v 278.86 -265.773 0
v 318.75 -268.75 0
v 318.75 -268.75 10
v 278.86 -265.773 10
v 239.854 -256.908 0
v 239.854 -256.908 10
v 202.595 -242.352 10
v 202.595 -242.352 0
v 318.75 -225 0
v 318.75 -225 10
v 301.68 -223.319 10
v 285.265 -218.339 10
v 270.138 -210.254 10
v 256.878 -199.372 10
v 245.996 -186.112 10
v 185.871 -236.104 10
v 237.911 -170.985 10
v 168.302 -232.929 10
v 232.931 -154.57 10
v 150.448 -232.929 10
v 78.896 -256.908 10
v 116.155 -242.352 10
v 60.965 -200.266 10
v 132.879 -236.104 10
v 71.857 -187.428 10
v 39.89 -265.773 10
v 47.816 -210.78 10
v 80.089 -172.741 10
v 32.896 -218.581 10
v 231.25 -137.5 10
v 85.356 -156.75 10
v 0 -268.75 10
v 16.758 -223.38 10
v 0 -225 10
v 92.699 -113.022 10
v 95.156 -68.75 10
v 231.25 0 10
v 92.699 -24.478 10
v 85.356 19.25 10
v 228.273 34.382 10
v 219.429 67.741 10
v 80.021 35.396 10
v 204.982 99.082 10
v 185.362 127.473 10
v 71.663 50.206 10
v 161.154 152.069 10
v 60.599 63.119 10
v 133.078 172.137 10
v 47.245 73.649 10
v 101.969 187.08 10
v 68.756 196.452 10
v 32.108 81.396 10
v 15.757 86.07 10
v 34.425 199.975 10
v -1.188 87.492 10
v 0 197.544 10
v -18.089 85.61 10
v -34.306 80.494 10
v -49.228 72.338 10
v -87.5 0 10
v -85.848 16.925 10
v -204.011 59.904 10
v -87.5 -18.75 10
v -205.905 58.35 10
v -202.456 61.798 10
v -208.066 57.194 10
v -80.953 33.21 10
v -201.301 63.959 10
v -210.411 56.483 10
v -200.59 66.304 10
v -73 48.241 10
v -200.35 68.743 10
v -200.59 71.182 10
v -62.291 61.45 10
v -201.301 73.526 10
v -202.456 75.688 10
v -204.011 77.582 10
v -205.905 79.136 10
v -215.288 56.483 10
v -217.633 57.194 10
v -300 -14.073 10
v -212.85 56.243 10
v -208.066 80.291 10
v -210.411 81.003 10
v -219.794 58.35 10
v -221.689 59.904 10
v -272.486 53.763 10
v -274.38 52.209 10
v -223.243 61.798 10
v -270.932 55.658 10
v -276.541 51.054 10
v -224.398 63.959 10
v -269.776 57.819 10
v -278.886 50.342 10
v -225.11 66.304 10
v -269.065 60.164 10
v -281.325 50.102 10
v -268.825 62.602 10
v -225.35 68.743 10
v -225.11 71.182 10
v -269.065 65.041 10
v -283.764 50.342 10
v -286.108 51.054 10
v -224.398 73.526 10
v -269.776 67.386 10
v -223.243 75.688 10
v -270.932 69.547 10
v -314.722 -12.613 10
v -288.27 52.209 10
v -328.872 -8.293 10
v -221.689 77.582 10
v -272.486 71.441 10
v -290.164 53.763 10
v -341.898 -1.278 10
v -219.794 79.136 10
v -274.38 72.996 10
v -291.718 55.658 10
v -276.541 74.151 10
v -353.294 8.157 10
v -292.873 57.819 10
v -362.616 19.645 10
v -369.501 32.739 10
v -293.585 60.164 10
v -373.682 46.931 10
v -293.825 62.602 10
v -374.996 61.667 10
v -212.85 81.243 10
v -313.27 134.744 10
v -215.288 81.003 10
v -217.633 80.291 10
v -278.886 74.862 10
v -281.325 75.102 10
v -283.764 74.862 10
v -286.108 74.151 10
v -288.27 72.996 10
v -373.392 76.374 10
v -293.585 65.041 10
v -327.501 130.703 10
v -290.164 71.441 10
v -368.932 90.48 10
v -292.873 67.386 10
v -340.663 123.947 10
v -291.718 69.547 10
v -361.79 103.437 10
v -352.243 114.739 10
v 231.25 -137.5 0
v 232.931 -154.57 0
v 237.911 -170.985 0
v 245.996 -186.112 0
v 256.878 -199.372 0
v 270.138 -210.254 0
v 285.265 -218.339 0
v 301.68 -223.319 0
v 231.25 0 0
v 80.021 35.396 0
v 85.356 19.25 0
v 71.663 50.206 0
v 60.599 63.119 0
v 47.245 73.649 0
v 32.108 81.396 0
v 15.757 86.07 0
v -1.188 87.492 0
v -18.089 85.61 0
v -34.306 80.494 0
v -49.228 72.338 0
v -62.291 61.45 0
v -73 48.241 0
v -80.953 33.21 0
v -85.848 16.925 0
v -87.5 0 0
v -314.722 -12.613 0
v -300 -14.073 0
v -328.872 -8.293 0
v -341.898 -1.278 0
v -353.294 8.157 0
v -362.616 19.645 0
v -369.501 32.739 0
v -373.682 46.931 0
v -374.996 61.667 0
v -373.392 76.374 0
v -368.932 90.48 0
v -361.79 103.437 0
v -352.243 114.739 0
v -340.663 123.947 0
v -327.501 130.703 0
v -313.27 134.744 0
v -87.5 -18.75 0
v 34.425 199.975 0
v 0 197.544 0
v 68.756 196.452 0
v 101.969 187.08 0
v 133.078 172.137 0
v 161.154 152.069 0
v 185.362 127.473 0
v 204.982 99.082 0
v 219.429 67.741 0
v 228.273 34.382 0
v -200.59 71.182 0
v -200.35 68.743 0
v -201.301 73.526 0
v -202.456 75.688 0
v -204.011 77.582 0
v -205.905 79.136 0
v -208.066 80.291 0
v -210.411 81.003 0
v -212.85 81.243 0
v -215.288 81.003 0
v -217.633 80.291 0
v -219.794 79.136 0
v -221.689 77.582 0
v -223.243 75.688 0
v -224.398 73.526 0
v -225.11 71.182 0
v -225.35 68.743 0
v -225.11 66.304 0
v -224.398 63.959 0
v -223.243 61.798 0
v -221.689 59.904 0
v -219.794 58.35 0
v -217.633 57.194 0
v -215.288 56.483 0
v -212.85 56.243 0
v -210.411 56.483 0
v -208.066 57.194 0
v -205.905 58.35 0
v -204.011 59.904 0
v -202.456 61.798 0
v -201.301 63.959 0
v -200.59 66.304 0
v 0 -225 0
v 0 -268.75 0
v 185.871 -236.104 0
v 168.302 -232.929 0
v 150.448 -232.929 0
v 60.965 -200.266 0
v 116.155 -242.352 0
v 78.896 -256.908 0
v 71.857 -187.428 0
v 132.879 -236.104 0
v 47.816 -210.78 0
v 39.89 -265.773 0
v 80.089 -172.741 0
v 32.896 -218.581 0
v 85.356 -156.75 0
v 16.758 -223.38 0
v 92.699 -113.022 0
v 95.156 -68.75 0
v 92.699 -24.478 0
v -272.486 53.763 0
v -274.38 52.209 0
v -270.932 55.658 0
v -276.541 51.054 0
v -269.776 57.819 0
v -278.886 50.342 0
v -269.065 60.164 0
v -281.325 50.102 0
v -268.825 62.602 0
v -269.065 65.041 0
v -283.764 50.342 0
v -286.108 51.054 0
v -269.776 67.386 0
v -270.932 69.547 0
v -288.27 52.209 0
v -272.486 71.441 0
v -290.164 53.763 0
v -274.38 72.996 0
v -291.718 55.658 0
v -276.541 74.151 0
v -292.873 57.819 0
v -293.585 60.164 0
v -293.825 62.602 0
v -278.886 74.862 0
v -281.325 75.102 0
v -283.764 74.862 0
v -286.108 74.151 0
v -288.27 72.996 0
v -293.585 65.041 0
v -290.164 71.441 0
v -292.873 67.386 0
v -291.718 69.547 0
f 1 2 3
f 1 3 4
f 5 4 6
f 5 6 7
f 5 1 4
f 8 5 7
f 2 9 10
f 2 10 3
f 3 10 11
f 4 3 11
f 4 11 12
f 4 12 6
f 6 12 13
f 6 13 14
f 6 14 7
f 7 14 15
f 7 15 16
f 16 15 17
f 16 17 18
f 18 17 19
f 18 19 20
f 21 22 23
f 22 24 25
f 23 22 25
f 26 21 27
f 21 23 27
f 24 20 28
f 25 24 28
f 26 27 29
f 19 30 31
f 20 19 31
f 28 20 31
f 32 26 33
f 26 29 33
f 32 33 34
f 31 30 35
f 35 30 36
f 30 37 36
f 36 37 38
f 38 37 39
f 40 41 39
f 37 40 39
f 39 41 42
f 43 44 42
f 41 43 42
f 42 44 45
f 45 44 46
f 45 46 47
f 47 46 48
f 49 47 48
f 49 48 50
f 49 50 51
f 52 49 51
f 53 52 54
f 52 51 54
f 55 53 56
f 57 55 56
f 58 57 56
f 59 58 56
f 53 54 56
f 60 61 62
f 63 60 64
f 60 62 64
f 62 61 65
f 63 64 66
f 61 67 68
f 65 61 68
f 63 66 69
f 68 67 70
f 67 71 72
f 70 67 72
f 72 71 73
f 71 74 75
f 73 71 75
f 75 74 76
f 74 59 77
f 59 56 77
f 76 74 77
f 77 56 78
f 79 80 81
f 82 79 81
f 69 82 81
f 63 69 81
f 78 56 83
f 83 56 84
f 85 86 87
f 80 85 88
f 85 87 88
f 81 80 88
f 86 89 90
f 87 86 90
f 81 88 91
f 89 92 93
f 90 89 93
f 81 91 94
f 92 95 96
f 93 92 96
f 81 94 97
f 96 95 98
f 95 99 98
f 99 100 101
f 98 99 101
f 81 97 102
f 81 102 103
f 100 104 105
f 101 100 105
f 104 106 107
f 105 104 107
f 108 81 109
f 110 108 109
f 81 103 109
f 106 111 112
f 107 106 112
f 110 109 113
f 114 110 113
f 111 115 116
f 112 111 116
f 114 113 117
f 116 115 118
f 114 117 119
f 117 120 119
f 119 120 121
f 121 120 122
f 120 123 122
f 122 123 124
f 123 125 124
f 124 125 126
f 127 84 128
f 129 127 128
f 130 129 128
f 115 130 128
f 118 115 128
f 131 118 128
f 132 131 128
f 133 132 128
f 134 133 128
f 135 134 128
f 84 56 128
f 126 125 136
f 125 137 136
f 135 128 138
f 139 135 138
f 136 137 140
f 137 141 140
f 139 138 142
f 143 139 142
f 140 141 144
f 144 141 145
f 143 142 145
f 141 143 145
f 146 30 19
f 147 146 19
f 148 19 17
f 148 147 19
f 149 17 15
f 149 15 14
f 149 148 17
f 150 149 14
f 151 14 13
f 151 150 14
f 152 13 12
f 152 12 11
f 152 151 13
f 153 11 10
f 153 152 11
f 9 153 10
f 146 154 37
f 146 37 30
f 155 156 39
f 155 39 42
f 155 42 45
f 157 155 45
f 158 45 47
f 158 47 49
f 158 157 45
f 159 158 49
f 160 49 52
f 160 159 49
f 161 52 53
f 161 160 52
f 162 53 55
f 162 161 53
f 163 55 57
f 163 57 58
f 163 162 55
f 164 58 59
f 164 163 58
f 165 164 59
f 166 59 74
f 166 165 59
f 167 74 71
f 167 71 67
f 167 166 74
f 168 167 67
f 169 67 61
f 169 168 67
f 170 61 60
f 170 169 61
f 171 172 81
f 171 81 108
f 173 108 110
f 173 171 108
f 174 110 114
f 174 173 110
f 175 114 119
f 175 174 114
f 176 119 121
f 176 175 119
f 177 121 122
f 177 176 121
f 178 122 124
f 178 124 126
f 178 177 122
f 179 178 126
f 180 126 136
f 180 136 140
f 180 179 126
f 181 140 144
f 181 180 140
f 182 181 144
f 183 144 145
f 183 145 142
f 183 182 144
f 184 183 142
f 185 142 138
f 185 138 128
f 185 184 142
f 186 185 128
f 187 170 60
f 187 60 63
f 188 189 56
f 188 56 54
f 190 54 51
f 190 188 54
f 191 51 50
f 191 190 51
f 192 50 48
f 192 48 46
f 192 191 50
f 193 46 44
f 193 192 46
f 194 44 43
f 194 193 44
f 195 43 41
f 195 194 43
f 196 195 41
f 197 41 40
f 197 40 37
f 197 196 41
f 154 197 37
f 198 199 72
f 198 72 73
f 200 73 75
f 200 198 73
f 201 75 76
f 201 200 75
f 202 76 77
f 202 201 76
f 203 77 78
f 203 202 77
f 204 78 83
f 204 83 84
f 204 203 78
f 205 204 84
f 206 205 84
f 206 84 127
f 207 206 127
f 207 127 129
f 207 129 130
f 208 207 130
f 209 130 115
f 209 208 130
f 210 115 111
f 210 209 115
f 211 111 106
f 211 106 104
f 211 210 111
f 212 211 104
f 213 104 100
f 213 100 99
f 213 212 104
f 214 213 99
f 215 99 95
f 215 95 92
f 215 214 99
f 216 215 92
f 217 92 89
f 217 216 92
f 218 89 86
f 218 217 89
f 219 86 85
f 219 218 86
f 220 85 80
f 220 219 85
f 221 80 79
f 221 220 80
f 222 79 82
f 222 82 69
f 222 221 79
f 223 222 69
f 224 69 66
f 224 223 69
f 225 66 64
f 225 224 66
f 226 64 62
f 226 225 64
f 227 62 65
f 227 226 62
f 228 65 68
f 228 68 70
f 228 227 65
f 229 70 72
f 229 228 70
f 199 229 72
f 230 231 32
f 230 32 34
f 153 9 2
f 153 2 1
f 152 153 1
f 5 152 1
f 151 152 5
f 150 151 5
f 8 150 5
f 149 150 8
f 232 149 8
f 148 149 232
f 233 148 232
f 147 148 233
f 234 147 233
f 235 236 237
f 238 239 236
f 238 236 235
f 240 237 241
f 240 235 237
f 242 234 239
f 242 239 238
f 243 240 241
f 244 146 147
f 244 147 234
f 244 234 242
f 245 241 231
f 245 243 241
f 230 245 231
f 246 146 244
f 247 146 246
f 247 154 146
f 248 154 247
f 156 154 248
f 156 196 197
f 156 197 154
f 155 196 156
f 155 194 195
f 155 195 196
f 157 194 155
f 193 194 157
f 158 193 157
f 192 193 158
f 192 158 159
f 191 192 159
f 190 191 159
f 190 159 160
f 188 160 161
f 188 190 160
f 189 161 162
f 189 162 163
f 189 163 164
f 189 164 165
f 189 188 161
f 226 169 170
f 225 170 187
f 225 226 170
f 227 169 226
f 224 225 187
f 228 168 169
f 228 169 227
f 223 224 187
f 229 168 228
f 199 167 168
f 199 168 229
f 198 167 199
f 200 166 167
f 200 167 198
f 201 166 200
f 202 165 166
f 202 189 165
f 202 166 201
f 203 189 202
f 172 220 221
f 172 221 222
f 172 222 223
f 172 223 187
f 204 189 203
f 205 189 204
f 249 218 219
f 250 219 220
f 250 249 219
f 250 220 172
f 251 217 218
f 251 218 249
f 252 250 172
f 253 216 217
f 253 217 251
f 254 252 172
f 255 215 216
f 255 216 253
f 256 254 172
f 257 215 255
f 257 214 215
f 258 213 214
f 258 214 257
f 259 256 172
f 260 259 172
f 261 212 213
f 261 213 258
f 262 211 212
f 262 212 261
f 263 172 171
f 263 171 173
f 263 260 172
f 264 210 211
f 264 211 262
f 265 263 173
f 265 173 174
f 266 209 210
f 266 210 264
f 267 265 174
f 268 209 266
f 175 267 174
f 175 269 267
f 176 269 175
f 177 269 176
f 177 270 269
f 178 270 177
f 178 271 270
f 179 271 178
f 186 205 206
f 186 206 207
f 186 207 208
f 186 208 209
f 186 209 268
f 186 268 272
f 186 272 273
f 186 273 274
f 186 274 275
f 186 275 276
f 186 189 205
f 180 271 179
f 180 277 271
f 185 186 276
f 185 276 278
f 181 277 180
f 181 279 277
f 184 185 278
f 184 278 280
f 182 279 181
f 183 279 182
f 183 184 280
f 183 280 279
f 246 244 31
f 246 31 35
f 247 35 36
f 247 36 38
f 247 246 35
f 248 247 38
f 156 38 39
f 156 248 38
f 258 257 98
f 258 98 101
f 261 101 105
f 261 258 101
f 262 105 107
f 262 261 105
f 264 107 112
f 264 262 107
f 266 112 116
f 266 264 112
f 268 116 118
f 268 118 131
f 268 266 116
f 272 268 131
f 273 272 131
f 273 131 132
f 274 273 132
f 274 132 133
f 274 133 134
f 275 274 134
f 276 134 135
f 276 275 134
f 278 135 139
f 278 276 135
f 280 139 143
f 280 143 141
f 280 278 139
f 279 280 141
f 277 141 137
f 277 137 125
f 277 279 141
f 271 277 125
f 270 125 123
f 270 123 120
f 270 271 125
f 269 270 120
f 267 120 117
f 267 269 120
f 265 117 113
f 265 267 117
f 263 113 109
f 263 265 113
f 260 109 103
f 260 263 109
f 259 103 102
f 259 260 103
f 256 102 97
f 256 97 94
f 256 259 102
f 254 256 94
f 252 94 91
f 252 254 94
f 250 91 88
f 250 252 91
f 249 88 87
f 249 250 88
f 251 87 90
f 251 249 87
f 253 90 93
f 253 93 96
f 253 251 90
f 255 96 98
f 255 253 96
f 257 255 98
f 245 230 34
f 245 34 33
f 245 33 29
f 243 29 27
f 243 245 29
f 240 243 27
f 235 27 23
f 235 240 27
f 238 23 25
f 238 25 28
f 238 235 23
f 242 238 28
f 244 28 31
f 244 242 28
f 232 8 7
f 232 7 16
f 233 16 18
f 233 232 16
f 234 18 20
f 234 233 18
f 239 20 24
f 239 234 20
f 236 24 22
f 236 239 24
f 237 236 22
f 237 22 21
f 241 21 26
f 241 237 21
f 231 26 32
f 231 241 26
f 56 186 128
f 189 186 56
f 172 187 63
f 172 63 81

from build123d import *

# Parameters (mm, degrees)
SKETCH1_R           = 12.5
BOSS_EXTRUDE1_DEPTH = 10


with BuildPart() as part:
    # Sketch1 → Boss-Extrude1 (new body)
    with BuildSketch(Plane.XY):
        with BuildLine():
            Line((231.25, 0), (231.25, -137.5))
            ThreePointArc((231.25, -137.5), (256.878155637, -199.371842345), (318.749997146, -225))
            Line((318.749997146, -225), (318.749997146, -268.75))
            ThreePointArc((318.749997146, -268.75), (259.191745399, -262.067504946), (202.595337169, -242.352341572))
            ThreePointArc((202.595337169, -242.352341572), (159.374998573, -232.529957041), (116.154659977, -242.352341572))
            ThreePointArc((116.154659977, -242.352341572), (59.558251747, -262.067504946), (0, -268.75))
            Line((0, -268.75), (0, -225))
            ThreePointArc((0, -225), (54.643732486, -205.839684664), (85.356238788, -156.75))
            ThreePointArc((85.356238788, -156.75), (95.156290044, -68.75), (85.356238788, 19.25))
            ThreePointArc((85.356238788, 19.25), (-9.68450066, 86.96240824), (-87.5, 0))
            Line((-87.5, 0), (-87.5, -18.75))
            Line((-87.5, -18.75), (-300, -14.072527462))
            ThreePointArc((-300, -14.072527462), (-374.703614676, 54.266394967), (-313.269508591, 134.744273754))
            Line((-313.269508591, 134.744273754), (0, 197.543507866))
            ThreePointArc((0, 197.543507866), (161.153810568, 152.069063257), (231.25, 0))
        make_face()
        with Locations((-281.324943498, 62.602215693)):
            Circle(SKETCH1_R, mode=Mode.SUBTRACT)
        with Locations((-212.849736322, 68.742940594)):
            Circle(SKETCH1_R, mode=Mode.SUBTRACT)
    extrude(amount=BOSS_EXTRUDE1_DEPTH)


solid = part.part
